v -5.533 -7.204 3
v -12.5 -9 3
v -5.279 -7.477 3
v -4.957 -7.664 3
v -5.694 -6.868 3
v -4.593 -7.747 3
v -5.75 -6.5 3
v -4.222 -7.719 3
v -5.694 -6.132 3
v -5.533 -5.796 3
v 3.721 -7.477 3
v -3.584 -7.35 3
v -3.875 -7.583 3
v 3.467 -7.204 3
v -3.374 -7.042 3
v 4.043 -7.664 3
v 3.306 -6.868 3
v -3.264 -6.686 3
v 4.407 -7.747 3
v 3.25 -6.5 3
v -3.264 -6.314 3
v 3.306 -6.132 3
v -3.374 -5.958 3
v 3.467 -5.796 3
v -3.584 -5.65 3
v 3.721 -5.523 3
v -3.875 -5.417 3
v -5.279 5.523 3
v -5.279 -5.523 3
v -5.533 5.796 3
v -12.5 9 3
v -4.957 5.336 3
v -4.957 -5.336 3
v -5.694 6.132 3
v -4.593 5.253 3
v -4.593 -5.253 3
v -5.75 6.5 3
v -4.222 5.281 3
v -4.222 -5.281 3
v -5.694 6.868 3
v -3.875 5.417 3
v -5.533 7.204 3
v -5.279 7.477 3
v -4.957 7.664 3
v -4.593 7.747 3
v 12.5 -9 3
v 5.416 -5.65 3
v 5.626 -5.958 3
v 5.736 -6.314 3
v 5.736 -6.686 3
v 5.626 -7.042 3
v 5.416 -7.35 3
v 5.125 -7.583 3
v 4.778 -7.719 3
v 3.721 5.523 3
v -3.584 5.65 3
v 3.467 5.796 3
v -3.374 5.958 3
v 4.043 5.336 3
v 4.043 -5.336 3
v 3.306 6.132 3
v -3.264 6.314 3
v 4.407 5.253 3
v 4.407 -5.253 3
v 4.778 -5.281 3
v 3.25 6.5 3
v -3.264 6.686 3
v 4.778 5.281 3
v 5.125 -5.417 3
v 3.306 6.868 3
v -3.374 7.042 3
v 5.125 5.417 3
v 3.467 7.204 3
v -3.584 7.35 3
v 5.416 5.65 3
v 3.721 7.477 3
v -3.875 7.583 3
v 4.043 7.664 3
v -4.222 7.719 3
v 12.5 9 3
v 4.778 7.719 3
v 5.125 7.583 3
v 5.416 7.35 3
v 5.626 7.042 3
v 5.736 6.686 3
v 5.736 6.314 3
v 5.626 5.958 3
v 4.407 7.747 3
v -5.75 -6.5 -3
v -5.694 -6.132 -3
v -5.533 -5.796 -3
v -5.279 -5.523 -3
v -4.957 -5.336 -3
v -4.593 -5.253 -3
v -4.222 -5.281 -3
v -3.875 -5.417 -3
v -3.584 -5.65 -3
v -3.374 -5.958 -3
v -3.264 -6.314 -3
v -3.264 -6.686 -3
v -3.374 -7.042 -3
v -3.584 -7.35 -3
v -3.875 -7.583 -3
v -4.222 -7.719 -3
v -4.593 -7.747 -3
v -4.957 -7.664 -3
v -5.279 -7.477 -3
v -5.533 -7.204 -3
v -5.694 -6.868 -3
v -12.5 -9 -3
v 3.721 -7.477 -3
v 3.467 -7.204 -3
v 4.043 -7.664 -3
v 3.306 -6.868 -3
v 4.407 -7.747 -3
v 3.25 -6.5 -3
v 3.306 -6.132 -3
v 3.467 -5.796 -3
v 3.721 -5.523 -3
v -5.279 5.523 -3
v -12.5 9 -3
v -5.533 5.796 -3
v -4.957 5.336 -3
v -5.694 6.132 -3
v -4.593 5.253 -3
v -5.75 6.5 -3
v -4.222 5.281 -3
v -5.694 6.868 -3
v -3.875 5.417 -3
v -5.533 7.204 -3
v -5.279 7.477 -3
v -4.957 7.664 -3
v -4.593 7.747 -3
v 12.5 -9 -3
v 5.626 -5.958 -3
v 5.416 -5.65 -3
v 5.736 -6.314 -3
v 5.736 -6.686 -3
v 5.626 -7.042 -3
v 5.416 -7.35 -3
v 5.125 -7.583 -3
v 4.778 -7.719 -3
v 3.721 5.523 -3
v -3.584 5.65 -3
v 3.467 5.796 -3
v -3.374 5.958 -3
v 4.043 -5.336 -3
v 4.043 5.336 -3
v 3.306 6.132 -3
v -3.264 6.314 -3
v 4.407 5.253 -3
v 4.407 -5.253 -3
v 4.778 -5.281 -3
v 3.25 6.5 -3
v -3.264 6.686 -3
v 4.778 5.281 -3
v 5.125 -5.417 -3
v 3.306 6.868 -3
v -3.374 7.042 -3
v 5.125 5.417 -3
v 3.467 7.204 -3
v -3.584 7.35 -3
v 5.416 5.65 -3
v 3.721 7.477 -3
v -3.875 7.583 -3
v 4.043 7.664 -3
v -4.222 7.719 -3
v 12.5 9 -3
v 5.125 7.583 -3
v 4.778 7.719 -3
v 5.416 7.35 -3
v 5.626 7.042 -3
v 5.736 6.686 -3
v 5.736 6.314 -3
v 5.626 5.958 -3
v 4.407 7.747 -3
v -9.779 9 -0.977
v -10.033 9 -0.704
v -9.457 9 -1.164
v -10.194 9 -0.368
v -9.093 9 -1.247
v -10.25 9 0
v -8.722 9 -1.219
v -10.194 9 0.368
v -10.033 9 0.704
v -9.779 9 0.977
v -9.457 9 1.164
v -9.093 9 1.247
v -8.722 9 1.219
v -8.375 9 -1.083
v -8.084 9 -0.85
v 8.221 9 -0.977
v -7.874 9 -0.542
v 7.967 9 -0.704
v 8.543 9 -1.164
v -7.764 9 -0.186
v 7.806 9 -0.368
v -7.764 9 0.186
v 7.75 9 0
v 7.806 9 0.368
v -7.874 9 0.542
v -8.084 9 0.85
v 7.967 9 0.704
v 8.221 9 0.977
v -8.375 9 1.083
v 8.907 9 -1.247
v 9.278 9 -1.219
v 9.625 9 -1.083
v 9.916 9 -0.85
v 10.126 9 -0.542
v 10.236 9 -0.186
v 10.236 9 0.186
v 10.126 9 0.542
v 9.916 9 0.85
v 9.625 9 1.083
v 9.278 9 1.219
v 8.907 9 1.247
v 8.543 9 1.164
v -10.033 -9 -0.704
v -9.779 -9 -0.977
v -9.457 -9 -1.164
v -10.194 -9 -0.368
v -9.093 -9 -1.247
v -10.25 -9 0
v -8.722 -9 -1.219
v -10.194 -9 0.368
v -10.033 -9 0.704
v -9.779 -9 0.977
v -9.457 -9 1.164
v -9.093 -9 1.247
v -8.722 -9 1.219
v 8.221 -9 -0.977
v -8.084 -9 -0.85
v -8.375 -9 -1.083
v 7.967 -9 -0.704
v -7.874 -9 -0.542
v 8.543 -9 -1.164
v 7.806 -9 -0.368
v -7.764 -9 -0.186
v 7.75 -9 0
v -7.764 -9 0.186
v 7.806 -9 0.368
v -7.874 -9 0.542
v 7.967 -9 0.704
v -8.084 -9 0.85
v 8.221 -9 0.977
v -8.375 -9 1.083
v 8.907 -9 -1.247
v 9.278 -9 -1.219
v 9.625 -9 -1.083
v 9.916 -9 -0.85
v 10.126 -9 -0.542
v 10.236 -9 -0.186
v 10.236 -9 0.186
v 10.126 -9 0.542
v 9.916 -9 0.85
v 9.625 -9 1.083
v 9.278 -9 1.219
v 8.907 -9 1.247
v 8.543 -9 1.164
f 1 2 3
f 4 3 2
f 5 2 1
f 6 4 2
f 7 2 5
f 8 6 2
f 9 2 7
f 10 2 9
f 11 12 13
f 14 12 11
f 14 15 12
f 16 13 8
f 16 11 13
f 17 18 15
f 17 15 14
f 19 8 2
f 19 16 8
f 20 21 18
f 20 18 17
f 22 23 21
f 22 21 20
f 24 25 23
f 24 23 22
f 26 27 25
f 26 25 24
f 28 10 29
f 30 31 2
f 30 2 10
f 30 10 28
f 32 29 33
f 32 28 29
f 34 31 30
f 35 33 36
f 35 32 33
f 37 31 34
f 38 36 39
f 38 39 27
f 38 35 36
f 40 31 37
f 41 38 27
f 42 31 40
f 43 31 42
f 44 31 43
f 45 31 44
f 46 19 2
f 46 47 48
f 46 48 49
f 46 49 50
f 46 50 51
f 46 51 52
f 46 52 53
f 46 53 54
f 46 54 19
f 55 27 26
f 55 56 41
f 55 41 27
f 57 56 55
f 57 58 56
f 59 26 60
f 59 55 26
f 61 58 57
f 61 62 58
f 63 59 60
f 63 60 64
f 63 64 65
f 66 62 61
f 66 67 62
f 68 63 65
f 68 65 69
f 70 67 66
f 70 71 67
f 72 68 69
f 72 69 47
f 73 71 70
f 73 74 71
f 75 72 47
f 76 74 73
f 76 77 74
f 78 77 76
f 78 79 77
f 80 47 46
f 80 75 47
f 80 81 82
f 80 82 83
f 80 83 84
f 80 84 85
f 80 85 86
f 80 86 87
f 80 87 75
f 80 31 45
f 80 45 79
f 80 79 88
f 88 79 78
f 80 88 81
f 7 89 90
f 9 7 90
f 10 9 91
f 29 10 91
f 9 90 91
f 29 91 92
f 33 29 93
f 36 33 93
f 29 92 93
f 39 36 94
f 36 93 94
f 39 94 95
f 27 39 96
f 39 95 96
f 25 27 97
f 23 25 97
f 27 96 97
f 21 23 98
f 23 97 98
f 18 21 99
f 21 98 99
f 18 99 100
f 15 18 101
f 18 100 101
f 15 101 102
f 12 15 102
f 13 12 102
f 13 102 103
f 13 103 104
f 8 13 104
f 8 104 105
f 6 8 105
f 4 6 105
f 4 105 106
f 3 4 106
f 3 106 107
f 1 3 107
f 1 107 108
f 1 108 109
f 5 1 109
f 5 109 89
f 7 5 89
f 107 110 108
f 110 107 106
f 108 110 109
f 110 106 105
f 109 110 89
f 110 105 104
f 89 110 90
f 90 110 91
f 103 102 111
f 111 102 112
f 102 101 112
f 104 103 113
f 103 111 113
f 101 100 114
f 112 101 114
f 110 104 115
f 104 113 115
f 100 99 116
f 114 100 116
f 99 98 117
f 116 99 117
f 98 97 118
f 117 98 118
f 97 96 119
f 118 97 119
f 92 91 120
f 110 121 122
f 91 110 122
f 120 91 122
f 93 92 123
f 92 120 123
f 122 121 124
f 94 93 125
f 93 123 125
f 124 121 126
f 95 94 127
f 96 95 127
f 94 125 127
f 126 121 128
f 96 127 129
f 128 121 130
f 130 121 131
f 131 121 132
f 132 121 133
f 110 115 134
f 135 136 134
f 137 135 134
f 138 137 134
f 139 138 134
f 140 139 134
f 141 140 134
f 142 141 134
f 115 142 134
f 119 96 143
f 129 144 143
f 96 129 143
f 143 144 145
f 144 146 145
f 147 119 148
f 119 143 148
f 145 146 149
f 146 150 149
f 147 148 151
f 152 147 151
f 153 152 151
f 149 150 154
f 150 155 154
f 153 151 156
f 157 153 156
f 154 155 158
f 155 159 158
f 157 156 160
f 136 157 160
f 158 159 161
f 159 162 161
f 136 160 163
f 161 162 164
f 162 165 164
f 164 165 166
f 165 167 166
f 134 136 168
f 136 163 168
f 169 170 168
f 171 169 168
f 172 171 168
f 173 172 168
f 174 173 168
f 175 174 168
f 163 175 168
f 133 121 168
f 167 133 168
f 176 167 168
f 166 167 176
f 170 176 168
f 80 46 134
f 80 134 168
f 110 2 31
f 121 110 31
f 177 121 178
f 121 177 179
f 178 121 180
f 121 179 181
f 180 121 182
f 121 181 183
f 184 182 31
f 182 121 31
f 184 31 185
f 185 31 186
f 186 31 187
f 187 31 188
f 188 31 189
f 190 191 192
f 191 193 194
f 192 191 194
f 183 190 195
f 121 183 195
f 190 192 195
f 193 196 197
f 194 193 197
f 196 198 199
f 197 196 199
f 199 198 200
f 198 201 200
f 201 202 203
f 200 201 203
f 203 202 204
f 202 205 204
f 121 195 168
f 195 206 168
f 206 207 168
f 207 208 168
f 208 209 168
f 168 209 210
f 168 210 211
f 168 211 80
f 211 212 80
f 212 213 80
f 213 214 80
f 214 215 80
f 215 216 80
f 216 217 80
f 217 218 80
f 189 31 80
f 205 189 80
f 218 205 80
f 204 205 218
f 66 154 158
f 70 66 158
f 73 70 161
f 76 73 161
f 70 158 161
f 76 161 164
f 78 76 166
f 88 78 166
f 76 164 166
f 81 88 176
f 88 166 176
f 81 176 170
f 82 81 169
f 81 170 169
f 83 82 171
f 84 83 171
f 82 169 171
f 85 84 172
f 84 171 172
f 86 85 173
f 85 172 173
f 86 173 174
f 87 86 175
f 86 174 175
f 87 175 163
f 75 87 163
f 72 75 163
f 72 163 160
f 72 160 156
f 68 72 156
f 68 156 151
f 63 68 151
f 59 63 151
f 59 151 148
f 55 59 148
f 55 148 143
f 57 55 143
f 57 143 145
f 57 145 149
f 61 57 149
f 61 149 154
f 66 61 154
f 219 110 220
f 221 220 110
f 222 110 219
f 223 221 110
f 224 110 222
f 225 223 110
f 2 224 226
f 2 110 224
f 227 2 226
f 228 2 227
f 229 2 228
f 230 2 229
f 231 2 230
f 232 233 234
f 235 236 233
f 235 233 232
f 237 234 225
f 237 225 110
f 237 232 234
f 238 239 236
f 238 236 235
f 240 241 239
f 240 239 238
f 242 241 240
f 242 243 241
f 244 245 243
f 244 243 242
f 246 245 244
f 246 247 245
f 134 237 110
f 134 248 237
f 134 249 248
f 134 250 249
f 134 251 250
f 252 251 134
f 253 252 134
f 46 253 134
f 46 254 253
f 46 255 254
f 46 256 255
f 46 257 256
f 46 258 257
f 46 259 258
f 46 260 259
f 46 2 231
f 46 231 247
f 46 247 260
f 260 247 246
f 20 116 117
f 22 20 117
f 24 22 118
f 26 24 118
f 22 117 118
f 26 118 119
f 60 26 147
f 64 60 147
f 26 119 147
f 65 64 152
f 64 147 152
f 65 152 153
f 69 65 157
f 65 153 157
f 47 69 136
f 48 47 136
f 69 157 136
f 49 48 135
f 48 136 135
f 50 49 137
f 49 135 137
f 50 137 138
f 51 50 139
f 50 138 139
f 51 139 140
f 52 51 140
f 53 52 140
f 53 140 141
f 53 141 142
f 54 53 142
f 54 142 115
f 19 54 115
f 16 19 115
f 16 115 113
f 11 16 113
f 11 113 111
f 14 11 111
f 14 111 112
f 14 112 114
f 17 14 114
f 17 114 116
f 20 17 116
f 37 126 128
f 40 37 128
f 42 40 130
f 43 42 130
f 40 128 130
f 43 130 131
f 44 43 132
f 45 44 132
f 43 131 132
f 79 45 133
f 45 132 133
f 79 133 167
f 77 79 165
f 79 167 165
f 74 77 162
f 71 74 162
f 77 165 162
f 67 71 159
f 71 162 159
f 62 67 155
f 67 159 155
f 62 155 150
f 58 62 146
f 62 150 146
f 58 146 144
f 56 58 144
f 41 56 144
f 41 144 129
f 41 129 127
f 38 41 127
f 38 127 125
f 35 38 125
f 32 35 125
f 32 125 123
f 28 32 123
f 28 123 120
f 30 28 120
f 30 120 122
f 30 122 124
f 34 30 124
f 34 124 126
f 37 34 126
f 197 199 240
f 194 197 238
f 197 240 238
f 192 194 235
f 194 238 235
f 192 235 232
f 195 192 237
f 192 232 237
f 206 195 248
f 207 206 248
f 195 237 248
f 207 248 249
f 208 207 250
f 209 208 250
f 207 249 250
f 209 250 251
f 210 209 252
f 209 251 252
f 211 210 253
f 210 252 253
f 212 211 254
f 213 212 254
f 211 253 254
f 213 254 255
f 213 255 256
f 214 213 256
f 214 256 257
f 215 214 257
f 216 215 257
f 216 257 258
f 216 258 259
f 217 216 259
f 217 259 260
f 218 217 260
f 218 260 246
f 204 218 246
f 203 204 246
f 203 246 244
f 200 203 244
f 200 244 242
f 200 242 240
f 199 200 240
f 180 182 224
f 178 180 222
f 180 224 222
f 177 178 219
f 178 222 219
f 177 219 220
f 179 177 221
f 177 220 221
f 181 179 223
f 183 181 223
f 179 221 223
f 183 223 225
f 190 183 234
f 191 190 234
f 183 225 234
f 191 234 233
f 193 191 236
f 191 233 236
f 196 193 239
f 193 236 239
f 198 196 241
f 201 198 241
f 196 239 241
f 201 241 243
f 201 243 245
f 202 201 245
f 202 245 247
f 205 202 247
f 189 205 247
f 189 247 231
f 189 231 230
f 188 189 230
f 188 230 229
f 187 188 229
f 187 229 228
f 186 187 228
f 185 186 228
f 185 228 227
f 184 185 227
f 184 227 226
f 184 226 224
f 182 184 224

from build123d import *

# Parameters (mm, degrees)
SKETCH_1_W             = 25
SKETCH_1_H             = 18
EXTRUDE_1_DEPTH        = 3
HOLE_WIZARD_M3_1_D     = 2.5
HOLE_WIZARD_M3_2_D     = 2.5
HOLE_WIZARD_M3_2_DEPTH = 8.5
HOLE_WIZARD_M3_2_TIP   = 0.751075774


with BuildPart() as part:
    # 草图1 → 凸台-拉伸1 (new, symmetric)
    with BuildSketch(Plane.XY):
        Rectangle(SKETCH_1_W, SKETCH_1_H)
    extrude(amount=EXTRUDE_1_DEPTH, both=True)

    # M3 螺纹孔1 (through all)
    with Locations(Plane(origin=(0, 9, 0), x_dir=(1, 0, 0), z_dir=(0, 1, 0))):
        with Locations((-9, 0), (9, 0)):
            Hole(HOLE_WIZARD_M3_1_D / 2)

    # M3 螺纹孔2
    with Locations(Plane.XY.offset(3)):
        with Locations((-4.5, -6.5), (4.5, -6.5), (4.5, 6.5), (-4.5, 6.5)):
            Hole(HOLE_WIZARD_M3_2_D / 2, depth=HOLE_WIZARD_M3_2_DEPTH)
            with Locations((0, 0, -(HOLE_WIZARD_M3_2_DEPTH + HOLE_WIZARD_M3_2_TIP / 2))):  # 118° drill point
                Cone(0, HOLE_WIZARD_M3_2_D / 2, HOLE_WIZARD_M3_2_TIP, mode=Mode.SUBTRACT)


solid = part.part
